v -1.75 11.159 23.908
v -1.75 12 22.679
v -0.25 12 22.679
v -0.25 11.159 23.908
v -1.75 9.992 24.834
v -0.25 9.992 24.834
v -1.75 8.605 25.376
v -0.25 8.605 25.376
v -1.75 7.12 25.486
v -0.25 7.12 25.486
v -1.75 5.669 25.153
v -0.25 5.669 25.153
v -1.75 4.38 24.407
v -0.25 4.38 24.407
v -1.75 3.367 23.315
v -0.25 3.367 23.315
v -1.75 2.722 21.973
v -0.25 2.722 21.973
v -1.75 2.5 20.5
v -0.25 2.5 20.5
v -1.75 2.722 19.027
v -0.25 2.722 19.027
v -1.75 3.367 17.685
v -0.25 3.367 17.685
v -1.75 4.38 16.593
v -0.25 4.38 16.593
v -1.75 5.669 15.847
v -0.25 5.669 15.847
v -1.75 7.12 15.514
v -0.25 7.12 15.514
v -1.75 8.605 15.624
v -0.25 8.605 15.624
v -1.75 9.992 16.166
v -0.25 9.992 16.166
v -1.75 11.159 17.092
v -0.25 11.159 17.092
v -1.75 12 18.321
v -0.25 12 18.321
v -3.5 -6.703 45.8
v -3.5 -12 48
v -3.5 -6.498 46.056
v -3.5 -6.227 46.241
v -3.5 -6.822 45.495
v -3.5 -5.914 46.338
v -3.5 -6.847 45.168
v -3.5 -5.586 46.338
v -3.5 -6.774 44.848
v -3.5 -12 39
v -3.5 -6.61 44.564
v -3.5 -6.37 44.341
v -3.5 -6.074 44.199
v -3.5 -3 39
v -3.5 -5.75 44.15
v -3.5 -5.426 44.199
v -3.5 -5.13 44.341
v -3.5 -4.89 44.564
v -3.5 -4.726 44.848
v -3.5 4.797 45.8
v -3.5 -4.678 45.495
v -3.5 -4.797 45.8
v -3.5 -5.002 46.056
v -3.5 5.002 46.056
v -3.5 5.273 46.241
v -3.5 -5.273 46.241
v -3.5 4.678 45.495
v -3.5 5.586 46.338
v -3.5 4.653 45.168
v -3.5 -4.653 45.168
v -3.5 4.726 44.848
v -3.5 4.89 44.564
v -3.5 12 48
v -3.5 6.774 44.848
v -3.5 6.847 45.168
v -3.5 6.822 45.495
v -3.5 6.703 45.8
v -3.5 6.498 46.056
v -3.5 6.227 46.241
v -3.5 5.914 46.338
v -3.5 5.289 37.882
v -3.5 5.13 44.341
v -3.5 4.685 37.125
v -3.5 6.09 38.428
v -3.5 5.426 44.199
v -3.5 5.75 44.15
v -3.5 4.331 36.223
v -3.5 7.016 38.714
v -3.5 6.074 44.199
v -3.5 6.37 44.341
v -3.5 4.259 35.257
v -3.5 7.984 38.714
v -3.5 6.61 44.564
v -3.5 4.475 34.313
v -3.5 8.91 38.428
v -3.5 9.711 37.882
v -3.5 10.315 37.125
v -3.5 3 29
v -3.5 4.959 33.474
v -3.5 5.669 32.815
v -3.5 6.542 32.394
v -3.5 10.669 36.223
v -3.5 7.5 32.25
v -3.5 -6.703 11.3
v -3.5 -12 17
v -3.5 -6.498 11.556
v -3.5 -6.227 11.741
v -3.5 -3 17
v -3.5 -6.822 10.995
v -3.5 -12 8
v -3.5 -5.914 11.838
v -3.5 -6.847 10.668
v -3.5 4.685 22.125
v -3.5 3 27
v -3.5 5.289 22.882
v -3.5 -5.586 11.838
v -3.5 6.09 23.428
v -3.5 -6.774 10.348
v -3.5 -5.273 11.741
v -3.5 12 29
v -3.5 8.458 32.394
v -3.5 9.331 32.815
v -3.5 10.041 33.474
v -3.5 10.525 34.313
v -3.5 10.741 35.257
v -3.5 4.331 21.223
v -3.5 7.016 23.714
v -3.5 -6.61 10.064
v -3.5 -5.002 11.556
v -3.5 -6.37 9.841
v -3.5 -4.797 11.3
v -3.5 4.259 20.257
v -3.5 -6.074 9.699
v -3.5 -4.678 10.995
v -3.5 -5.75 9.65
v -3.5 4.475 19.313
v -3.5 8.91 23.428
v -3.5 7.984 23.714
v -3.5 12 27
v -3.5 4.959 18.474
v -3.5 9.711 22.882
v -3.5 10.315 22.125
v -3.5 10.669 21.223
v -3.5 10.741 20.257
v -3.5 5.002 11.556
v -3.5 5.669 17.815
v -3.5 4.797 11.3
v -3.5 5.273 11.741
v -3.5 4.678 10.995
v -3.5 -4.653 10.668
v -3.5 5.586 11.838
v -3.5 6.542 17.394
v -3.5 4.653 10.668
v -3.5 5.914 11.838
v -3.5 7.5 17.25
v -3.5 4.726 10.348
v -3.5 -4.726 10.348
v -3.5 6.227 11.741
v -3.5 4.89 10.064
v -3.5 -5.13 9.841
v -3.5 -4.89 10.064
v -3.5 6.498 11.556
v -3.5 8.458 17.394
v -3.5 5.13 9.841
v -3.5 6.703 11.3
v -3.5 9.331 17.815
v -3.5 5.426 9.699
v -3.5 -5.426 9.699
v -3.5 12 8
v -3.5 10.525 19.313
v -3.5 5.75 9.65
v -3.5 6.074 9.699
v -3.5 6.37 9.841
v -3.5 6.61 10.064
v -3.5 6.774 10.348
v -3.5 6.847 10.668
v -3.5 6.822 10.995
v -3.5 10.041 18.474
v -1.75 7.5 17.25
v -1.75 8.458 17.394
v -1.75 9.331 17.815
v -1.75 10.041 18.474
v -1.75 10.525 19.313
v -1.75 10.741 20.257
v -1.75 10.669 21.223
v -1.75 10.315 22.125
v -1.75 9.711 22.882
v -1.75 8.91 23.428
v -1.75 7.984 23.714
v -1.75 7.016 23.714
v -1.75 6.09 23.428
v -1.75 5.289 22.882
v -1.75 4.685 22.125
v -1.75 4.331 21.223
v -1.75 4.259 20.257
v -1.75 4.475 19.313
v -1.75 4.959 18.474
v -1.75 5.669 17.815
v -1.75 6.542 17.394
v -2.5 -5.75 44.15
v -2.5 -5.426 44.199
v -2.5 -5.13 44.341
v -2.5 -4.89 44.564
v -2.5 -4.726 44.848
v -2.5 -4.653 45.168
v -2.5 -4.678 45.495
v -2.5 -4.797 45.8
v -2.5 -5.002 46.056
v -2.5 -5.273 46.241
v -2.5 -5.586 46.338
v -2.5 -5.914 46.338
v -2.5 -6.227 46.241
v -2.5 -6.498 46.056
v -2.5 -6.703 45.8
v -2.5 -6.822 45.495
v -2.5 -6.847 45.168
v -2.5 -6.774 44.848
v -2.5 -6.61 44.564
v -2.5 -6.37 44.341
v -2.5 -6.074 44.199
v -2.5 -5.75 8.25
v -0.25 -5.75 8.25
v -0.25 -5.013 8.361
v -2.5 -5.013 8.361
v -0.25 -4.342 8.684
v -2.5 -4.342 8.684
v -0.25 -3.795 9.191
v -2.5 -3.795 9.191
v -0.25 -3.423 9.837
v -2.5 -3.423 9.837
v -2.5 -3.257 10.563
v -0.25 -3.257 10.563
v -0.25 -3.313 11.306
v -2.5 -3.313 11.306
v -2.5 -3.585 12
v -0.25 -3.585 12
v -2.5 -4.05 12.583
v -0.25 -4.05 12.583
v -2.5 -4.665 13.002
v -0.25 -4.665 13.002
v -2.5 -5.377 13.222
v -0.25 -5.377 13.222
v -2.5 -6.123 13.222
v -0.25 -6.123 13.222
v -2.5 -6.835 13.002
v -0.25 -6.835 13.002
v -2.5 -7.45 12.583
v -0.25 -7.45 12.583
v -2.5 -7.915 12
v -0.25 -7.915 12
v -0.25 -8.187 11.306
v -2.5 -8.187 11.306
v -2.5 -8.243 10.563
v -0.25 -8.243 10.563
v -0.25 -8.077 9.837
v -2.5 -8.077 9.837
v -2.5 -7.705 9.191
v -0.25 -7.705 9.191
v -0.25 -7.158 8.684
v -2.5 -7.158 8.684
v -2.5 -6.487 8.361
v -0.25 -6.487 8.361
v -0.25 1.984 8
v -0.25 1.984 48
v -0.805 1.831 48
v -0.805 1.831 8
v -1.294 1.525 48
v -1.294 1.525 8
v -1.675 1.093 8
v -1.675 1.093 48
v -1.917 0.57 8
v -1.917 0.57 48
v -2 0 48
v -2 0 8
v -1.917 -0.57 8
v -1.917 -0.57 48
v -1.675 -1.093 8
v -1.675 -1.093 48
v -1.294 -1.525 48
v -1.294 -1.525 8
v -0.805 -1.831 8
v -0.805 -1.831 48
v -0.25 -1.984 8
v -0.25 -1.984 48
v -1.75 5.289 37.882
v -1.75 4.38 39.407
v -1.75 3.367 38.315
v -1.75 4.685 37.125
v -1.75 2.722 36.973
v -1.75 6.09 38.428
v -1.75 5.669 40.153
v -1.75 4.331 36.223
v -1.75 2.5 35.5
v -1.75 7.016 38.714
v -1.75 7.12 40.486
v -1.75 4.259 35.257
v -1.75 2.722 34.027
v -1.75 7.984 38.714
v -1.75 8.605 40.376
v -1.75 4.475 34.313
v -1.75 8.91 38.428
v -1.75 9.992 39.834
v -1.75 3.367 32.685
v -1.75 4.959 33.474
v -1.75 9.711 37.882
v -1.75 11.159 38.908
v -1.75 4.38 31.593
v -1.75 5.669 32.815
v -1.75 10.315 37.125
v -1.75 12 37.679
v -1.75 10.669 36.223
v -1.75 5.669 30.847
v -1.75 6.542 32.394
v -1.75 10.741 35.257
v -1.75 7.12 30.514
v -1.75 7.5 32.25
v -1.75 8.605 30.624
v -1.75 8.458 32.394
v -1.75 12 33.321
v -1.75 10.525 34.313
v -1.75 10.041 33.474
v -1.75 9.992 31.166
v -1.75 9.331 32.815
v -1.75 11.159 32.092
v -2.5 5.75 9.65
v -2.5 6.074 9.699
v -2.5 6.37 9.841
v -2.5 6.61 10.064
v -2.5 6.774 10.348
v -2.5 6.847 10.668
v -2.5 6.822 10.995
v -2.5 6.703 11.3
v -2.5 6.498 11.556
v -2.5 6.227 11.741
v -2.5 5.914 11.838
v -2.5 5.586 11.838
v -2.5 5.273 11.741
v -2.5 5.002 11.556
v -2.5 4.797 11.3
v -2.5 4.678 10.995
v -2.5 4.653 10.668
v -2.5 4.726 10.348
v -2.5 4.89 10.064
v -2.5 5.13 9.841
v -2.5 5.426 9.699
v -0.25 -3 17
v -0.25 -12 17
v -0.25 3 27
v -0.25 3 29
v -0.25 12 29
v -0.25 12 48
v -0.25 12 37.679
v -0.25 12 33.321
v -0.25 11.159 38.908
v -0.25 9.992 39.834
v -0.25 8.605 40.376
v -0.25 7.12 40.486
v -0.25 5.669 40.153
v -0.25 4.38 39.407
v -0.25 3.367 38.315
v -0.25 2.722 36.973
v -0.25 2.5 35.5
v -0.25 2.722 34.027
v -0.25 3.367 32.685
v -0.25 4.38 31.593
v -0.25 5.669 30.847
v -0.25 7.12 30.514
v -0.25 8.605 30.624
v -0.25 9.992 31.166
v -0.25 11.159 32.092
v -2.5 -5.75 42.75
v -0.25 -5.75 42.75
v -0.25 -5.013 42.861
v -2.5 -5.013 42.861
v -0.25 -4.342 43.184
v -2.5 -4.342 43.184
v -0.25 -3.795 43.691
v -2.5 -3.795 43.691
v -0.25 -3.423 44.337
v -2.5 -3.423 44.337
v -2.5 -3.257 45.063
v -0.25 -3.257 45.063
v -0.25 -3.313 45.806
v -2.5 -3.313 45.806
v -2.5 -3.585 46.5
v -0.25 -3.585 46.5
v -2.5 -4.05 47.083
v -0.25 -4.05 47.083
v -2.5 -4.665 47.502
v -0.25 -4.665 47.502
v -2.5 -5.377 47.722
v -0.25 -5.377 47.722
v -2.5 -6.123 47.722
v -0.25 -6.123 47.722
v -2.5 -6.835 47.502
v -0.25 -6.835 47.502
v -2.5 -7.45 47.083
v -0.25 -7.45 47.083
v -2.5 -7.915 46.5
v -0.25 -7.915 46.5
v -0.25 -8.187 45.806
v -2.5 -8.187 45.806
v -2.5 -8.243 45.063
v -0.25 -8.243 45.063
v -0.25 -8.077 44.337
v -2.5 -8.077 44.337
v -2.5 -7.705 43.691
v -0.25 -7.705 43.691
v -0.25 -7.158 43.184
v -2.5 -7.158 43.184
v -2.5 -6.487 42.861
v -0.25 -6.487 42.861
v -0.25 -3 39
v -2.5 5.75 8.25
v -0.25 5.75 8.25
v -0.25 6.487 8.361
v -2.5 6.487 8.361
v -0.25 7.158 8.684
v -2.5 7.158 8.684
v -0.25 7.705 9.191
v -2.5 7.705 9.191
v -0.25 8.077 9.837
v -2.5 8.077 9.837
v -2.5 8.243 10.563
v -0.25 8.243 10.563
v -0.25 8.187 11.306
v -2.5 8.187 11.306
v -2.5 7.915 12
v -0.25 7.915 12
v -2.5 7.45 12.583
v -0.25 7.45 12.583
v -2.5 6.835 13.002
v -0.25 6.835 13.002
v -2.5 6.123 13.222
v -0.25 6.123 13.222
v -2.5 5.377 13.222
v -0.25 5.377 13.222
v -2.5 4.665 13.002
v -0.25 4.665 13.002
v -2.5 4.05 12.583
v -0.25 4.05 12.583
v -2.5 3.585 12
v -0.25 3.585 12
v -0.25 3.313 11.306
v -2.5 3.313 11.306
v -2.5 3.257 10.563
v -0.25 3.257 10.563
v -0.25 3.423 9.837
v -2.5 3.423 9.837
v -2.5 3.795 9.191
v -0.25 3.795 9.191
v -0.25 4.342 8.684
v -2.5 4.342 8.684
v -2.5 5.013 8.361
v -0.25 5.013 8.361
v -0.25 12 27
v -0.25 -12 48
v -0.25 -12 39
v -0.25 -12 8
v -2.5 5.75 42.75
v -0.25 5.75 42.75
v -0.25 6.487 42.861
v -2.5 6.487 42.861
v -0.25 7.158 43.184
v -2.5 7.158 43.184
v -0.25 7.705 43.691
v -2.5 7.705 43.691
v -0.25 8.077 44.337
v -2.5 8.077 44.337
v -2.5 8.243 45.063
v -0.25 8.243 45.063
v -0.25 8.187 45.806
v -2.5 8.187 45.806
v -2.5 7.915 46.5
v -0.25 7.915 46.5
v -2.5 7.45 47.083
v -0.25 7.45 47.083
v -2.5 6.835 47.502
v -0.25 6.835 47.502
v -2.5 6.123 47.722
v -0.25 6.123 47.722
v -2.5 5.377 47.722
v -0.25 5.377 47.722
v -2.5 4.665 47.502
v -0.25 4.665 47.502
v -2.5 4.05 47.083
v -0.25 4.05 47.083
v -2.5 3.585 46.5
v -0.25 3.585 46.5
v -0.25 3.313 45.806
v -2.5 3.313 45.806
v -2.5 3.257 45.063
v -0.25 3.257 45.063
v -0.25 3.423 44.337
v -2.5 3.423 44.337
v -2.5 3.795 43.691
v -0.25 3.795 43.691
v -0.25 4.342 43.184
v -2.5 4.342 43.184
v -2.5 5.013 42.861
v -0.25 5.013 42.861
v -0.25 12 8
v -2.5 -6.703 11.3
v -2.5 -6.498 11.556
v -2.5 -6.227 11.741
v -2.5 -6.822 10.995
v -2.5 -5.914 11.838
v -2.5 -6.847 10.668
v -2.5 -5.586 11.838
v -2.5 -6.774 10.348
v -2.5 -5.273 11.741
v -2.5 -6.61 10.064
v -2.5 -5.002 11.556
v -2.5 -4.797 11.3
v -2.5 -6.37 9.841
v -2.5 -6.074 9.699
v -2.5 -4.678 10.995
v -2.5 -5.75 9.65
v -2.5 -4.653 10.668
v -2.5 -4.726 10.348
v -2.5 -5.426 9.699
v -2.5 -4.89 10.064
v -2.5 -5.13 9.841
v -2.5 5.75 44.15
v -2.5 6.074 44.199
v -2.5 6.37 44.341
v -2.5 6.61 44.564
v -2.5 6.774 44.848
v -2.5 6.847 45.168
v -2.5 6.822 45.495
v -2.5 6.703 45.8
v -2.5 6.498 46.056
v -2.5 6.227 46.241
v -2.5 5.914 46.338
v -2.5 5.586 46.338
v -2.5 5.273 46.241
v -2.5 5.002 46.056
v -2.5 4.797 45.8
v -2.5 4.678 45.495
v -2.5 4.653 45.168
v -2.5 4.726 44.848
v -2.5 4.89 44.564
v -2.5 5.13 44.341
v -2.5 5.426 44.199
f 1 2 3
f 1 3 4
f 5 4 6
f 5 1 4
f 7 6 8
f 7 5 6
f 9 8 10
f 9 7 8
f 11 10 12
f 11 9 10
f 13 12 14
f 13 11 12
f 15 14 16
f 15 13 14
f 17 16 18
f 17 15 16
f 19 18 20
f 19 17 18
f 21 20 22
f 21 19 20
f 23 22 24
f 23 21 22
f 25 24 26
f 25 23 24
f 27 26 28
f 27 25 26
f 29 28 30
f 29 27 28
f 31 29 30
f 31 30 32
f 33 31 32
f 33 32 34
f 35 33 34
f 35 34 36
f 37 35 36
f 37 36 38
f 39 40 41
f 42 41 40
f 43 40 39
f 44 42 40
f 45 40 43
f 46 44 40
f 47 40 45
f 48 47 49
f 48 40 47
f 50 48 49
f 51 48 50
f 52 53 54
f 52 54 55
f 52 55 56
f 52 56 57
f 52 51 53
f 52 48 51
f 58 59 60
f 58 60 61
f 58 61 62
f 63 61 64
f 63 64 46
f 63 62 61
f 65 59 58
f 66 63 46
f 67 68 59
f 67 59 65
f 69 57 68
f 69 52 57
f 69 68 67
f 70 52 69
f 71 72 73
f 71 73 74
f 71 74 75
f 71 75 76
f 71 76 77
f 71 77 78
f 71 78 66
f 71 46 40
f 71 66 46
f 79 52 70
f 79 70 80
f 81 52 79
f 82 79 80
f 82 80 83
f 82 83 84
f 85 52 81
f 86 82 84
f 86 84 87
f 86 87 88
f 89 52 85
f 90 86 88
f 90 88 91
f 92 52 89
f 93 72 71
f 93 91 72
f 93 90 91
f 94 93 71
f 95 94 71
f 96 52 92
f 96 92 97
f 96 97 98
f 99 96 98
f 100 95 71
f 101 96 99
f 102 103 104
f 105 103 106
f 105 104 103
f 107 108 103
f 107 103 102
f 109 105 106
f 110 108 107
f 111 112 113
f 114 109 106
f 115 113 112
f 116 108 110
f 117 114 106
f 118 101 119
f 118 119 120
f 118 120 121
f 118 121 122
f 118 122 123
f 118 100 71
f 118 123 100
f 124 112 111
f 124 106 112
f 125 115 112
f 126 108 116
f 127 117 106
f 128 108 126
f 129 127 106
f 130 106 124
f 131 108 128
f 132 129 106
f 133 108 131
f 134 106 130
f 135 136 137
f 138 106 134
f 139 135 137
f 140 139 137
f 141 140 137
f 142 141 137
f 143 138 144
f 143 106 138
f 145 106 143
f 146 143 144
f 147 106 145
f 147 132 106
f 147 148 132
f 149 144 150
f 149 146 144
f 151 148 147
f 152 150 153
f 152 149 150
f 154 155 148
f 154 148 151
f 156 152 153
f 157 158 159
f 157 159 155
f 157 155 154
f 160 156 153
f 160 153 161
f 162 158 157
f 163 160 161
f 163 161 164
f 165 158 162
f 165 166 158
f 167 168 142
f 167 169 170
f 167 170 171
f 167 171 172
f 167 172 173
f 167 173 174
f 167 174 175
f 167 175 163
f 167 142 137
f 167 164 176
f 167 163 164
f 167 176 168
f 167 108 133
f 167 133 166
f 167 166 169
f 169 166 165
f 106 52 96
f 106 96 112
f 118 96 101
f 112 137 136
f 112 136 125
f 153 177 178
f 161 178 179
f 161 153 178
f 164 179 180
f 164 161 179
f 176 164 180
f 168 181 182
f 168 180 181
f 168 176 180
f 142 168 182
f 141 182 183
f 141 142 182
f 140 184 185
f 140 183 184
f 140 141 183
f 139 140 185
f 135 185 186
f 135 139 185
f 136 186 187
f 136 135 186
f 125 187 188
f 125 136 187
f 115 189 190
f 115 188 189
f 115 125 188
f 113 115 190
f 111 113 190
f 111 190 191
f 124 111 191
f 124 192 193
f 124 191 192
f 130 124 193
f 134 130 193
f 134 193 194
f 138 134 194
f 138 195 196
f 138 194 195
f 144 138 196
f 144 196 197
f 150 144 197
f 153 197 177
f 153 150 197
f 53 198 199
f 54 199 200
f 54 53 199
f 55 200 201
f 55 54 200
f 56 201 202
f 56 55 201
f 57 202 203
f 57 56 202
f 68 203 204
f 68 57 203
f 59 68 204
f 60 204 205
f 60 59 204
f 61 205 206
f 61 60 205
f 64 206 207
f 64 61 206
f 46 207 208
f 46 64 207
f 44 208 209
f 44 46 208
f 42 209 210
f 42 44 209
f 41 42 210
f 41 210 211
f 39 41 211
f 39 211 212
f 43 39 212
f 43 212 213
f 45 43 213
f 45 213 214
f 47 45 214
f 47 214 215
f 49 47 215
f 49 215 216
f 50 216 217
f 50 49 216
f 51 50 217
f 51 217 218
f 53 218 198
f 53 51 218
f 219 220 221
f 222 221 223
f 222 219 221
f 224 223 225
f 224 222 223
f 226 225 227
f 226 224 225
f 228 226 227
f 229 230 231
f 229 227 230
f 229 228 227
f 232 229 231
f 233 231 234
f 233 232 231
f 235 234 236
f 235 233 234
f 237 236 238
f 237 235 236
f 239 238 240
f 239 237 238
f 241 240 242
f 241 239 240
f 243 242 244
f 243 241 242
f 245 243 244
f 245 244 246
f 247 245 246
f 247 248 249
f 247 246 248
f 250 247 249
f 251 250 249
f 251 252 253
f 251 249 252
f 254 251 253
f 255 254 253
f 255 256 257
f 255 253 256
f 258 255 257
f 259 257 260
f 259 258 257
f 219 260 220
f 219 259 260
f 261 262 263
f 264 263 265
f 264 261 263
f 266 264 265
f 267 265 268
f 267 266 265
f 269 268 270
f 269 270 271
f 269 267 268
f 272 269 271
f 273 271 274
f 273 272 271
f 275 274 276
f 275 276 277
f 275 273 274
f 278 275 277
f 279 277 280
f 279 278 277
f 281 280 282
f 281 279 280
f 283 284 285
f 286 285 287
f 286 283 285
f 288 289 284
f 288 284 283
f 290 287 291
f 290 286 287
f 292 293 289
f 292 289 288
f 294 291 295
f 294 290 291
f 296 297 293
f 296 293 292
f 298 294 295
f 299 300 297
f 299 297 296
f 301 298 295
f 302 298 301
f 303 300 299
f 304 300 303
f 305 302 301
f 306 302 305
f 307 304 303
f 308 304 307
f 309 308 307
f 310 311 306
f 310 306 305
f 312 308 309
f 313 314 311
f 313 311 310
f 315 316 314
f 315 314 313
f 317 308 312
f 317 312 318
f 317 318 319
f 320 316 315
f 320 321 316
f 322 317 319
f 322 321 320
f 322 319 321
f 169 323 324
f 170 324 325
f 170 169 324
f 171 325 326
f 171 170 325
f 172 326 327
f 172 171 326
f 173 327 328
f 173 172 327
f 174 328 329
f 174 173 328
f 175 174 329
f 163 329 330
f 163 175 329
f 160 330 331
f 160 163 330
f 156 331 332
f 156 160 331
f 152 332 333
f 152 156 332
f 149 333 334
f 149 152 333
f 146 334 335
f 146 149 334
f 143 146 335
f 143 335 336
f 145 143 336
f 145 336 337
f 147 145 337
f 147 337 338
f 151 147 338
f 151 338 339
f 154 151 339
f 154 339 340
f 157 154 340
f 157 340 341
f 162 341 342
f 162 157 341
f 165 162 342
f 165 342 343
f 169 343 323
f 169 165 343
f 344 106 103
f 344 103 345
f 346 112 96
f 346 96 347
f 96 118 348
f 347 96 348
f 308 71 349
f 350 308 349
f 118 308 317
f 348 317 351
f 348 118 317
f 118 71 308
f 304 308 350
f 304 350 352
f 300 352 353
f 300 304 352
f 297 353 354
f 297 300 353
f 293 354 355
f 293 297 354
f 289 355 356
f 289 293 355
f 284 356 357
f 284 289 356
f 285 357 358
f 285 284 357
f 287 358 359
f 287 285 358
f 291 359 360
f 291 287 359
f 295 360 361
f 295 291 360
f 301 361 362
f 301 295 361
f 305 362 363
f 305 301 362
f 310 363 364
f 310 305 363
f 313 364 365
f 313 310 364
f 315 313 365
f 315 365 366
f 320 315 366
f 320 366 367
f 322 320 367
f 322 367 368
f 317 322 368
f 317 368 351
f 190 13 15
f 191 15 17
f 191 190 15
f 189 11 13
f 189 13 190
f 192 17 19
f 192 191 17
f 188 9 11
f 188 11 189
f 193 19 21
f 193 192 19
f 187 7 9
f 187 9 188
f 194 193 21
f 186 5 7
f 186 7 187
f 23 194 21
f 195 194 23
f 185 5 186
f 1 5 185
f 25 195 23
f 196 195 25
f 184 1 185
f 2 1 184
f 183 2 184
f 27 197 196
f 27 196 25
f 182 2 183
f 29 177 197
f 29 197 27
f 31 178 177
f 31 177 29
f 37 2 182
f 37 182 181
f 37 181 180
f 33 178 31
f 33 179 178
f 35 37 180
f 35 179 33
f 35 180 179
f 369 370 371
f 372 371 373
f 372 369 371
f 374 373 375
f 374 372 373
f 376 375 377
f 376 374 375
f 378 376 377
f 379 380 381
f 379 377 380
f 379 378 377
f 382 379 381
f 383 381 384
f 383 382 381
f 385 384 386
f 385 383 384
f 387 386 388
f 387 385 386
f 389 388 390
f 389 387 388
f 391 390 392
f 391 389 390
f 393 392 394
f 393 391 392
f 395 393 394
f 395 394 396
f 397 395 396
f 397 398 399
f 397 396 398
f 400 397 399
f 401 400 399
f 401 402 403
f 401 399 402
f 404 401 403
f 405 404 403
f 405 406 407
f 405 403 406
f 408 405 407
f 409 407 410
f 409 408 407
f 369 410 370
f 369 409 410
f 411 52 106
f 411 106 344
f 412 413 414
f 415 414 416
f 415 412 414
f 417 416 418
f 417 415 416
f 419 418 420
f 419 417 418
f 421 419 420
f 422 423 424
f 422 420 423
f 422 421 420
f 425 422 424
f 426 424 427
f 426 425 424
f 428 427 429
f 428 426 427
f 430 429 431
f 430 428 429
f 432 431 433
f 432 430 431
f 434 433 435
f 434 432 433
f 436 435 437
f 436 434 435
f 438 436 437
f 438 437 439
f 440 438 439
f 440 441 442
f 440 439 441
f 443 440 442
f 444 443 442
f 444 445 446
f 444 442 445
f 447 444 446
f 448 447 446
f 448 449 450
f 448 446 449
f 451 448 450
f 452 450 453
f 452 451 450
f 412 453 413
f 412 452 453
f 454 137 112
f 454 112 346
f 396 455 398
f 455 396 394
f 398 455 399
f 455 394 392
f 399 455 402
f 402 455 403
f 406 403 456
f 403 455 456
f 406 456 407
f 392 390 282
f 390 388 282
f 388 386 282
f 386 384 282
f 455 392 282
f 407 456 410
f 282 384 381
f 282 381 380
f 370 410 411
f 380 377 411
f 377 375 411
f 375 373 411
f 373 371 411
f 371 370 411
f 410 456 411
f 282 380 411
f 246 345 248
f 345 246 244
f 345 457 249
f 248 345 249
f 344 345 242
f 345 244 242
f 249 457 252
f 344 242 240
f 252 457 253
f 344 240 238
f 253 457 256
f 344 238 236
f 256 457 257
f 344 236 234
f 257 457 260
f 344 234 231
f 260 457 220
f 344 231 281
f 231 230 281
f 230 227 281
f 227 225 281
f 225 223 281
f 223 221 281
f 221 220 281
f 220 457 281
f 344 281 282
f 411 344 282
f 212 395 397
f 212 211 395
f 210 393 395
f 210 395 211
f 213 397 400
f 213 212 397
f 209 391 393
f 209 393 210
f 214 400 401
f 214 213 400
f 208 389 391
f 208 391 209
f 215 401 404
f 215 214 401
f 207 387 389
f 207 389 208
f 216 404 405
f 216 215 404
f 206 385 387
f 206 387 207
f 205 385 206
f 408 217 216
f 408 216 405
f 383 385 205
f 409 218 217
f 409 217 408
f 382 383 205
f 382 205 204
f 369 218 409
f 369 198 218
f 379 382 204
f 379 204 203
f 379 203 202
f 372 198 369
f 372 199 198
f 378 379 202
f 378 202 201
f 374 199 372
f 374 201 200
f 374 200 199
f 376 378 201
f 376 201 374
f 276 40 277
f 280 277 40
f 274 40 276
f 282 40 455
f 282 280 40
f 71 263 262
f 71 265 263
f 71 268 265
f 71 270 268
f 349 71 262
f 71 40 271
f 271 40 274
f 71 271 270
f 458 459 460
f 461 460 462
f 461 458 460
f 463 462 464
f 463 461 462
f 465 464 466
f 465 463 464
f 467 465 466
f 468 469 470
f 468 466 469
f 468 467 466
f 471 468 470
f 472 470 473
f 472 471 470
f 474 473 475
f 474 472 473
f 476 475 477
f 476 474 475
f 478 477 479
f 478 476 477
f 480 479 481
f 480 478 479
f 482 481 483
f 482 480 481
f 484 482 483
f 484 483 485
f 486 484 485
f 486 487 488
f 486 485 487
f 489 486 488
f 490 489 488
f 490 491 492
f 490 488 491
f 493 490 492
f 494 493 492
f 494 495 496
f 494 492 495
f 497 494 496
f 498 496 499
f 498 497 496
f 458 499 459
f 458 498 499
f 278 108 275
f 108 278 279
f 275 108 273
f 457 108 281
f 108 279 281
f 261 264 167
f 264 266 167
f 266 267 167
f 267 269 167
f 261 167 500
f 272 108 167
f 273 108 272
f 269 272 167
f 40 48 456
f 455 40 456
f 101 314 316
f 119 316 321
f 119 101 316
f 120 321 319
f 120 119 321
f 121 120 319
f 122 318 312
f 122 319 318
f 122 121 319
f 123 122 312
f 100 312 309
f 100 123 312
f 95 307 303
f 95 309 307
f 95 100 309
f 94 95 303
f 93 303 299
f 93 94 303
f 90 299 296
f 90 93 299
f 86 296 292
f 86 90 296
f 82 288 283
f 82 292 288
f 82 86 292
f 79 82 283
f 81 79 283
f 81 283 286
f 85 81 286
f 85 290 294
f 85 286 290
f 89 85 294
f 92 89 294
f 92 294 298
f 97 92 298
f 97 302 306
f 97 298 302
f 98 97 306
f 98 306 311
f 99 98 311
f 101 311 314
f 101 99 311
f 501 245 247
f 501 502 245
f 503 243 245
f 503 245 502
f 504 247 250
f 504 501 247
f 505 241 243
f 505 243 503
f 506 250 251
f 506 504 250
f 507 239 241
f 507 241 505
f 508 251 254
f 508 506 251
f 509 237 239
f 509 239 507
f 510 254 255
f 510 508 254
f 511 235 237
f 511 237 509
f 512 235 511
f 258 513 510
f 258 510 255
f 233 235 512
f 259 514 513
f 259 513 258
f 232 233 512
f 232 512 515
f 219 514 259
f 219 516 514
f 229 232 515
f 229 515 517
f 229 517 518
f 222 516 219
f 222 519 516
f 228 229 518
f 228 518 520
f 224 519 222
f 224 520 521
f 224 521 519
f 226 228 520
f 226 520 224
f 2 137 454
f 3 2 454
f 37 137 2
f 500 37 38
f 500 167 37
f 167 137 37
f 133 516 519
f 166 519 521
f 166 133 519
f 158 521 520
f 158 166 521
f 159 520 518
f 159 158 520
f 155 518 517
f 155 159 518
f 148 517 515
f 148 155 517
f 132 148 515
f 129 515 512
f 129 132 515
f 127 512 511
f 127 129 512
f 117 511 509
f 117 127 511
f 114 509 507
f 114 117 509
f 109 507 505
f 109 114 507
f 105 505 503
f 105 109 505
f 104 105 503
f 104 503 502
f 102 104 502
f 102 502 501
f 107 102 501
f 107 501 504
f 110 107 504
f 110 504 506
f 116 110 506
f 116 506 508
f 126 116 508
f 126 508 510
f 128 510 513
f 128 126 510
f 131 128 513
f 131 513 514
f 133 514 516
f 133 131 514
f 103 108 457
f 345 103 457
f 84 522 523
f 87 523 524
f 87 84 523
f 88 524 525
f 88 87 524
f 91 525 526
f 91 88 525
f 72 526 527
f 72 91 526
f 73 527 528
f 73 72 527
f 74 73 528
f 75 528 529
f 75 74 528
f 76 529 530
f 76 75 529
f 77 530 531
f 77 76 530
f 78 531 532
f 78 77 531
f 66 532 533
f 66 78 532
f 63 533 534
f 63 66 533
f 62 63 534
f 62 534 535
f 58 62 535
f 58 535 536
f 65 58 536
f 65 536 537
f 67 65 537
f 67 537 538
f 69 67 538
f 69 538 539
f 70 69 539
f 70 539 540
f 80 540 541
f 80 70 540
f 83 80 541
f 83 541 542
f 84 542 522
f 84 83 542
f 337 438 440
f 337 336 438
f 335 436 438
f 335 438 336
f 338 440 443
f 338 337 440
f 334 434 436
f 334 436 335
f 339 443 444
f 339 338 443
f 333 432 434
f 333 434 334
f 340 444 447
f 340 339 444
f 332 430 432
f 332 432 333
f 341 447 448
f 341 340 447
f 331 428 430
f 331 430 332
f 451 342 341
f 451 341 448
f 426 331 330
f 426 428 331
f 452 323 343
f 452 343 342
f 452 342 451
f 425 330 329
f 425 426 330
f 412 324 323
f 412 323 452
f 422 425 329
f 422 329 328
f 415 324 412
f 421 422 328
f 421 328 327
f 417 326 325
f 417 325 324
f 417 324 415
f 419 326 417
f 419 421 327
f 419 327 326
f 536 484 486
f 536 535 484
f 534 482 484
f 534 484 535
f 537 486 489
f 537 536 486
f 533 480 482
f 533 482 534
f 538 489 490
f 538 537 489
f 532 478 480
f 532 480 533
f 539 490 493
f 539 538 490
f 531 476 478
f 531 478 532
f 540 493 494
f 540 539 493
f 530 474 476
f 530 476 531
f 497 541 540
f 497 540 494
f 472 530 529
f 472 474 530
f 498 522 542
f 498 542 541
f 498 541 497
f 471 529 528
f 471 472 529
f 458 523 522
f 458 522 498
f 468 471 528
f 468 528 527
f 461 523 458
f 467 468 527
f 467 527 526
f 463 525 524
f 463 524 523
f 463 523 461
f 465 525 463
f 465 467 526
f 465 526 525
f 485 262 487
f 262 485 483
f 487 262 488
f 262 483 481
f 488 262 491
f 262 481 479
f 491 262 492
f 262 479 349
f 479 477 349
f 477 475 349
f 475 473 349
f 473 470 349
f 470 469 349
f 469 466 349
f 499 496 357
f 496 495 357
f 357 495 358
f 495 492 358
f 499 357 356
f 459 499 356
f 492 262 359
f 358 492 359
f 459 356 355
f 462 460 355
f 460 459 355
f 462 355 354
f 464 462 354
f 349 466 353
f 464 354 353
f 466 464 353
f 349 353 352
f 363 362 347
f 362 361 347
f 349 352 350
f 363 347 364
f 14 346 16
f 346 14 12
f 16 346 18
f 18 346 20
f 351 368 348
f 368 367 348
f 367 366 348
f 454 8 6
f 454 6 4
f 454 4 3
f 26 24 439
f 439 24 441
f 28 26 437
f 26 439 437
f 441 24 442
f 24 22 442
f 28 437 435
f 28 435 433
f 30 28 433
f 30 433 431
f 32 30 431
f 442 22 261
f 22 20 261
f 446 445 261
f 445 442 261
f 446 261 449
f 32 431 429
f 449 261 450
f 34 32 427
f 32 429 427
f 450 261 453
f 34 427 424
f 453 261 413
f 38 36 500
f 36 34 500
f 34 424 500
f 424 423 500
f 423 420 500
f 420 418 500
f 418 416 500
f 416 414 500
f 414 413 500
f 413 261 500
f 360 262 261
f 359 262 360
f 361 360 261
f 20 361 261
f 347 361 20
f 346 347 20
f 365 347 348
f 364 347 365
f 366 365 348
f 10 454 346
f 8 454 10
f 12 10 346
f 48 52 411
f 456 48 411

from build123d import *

# Parameters (mm, degrees)
CYLINDER028_R           = 1.1
CYLINDER028_DEPTH       = 10
CYLINDER031_R           = 0.9
CYLINDER031_DEPTH       = 10
CYLINDER029_R           = 2.5
CYLINDER029_DEPTH       = 3.5
CYLINDER030_R           = 2
CYLINDER030_DEPTH       = 5.2
LINK011_PLACEMENT_ANGLE = 90
LINK012_PLACEMENT_ANGLE = 90
CYLINDER027_R           = 1.1
CYLINDER027_DEPTH       = 10
CYLINDER025_R           = 1.1
CYLINDER025_DEPTH       = 10
CYLINDER026_R           = 1.1
CYLINDER026_DEPTH       = 10
LINK010_PLACEMENT_ANGLE = 90
LINK009_PLACEMENT_ANGLE = 90
CYLINDER018_R           = 3.25
CYLINDER018_DEPTH       = 10
BOX010_W                = 3.25
BOX010_H                = 9
BOX010_DEPTH            = 22
BOX009_W                = 3.25
BOX009_H                = 9
BOX009_DEPTH            = 2
CYLINDER024_R           = 5
CYLINDER024_DEPTH       = 1.5
CYLINDER023_R           = 5
CYLINDER023_DEPTH       = 1.5
CYLINDER019_R           = 3.25
CYLINDER019_DEPTH       = 10
CYLINDER004_R           = 2
CYLINDER004_DEPTH       = 40
BOX004_W                = 3.25
BOX004_H                = 24
BOX004_DEPTH            = 40


with BuildPart() as cylinder028:
    # Cylinder028 → Cylinder028 (new body)
    with BuildSketch(Plane(origin=(-3.5, 5.75, 44.25), x_dir=(0, 0, -1), z_dir=(1, 0, 0))):
        Circle(CYLINDER028_R)
    extrude(amount=CYLINDER028_DEPTH)


with BuildPart() as cylinder031:
    # Cylinder031 → Cylinder031 (new body)
    with BuildSketch(Plane.XY):
        Circle(CYLINDER031_R)
    extrude(amount=CYLINDER031_DEPTH)


with BuildPart() as cylinder029:
    # Cylinder029 → Cylinder029 (new body)
    with BuildSketch(Plane.XY):
        Circle(CYLINDER029_R)
    extrude(amount=CYLINDER029_DEPTH)


with BuildPart() as markor4mmod_m011:
    # Cylinder030 → Cylinder030 (new body)
    with BuildSketch(Plane.XY):
        Circle(CYLINDER030_R)
    extrude(amount=CYLINDER030_DEPTH)

    # Fusion018: union Cylinder029
    add(cylinder029.part)

    # Cut007: cut Cylinder031
    add(cylinder031.part, mode=Mode.SUBTRACT)


with BuildPart() as markor4mmod_m014:
    # Link011 base: copy of Markor4mmOD_M011
    add(markor4mmod_m011.part)


with BuildPart() as markor4mmod_m014_1:
    # Link011 placement: moved
    add(markor4mmod_m014.part.moved(Location((-2.5, -5.75, 44.25))).rotate(Axis((-2.5, -5.75, 44.25), (0, 1, 0)), LINK011_PLACEMENT_ANGLE))


with BuildPart() as markor4mmod_m015:
    # Link012 base: copy of Markor4mmOD_M011
    add(markor4mmod_m011.part)


with BuildPart() as markor4mmod_m015_1:
    # Link012 placement: moved
    add(markor4mmod_m015.part.moved(Location((-2.5, 5.75, 44.25))).rotate(Axis((-2.5, 5.75, 44.25), (0, 1, 0)), LINK012_PLACEMENT_ANGLE))


with BuildPart() as fusion017:
    # Cylinder027 → Cylinder027 (new body)
    with BuildSketch(Plane(origin=(-3.5, -5.75, 44.25), x_dir=(0, 0, -1), z_dir=(1, 0, 0))):
        Circle(CYLINDER027_R)
    extrude(amount=CYLINDER027_DEPTH)

    # Fusion017: union Cylinder028, Markor4mmOD_M014, Markor4mmOD_M015
    add(cylinder028.part)
    add(markor4mmod_m014_1.part)
    add(markor4mmod_m015_1.part)


with BuildPart() as cylinder025:
    # Cylinder025 → Cylinder025 (new body)
    with BuildSketch(Plane(origin=(-3.5, -5.75, 9.75), x_dir=(0, 0, -1), z_dir=(1, 0, 0))):
        Circle(CYLINDER025_R)
    extrude(amount=CYLINDER025_DEPTH)


with BuildPart() as cylinder026:
    # Cylinder026 → Cylinder026 (new body)
    with BuildSketch(Plane(origin=(-3.5, 5.75, 9.75), x_dir=(0, 0, -1), z_dir=(1, 0, 0))):
        Circle(CYLINDER026_R)
    extrude(amount=CYLINDER026_DEPTH)


with BuildPart() as markor4mmod_m013:
    # Link010 base: copy of Markor4mmOD_M011
    add(markor4mmod_m011.part)


with BuildPart() as markor4mmod_m013_1:
    # Link010 placement: moved
    add(markor4mmod_m013.part.moved(Location((-2.5, 5.75, 9.75))).rotate(Axis((-2.5, 5.75, 9.75), (0, 1, 0)), LINK010_PLACEMENT_ANGLE))


with BuildPart() as fusion019:
    # Link009 base: copy of Markor4mmOD_M011
    add(markor4mmod_m011.part)


with BuildPart() as fusion019_1:
    # Link009 placement: moved
    add(fusion019.part.moved(Location((-2.5, -5.75, 9.75))).rotate(Axis((-2.5, -5.75, 9.75), (0, 1, 0)), LINK009_PLACEMENT_ANGLE))

    # Fusion016: union Cylinder025, Cylinder026, Markor4mmOD_M013
    add(cylinder025.part)
    add(cylinder026.part)
    add(markor4mmod_m013_1.part)

    # Fusion019: union Fusion017
    add(fusion017.part)


with BuildPart() as cylinder018:
    # Cylinder018 → Cylinder018 (new body)
    with BuildSketch(Plane(origin=(-3.5, 7.5, 34.5), x_dir=(0, 0, -1), z_dir=(1, 0, 0))):
        Circle(CYLINDER018_R)
    extrude(amount=CYLINDER018_DEPTH)


with BuildPart() as cube010:
    # Box010 → Box010 (new body)
    with BuildSketch(Plane(origin=(-3.5, -12, 16), x_dir=(1, 0, 0), z_dir=(0, 0, 1))):
        with Locations((1.625, 4.5)):
            Rectangle(BOX010_W, BOX010_H)
    extrude(amount=BOX010_DEPTH)


with BuildPart() as cube009:
    # Box009 → Box009 (new body)
    with BuildSketch(Plane(origin=(-3.5, 3, 26), x_dir=(1, 0, 0), z_dir=(0, 0, 1))):
        with Locations((1.625, 4.5)):
            Rectangle(BOX009_W, BOX009_H)
    extrude(amount=BOX009_DEPTH)


with BuildPart() as cylinder024:
    # Cylinder024 → Cylinder024 (new body)
    with BuildSketch(Plane(origin=(-1.75, 7.5, 19.5), x_dir=(0, 0, -1), z_dir=(1, 0, 0))):
        Circle(CYLINDER024_R)
    extrude(amount=CYLINDER024_DEPTH)


with BuildPart() as fusion015:
    # Cylinder023 → Cylinder023 (new body)
    with BuildSketch(Plane(origin=(-1.75, 7.5, 34.5), x_dir=(0, 0, -1), z_dir=(1, 0, 0))):
        Circle(CYLINDER023_R)
    extrude(amount=CYLINDER023_DEPTH)

    # Fusion015: union Cylinder024
    add(cylinder024.part)


with BuildPart() as fusion011:
    # Cylinder019 → Cylinder019 (new body)
    with BuildSketch(Plane(origin=(-3.5, 7.5, 19.5), x_dir=(0, 0, -1), z_dir=(1, 0, 0))):
        Circle(CYLINDER019_R)
    extrude(amount=CYLINDER019_DEPTH)

    # Fusion011: union Cylinder018, Cube010, Cube009, Fusion015
    add(cylinder018.part)
    add(cube010.part)
    add(cube009.part)
    add(fusion015.part)


with BuildPart() as beamhole:
    # Cylinder004 → Cylinder004 (new body)
    with BuildSketch(Plane.XY):
        Circle(CYLINDER004_R)
    extrude(amount=CYLINDER004_DEPTH)


with BuildPart() as coppera:
    # Box004 → Box004 (new body)
    with BuildSketch(Plane(origin=(-3.5, -12, 0), x_dir=(1, 0, 0), z_dir=(0, 0, 1))):
        with Locations((1.625, 12)):
            Rectangle(BOX004_W, BOX004_H)
    extrude(amount=BOX004_DEPTH)

    # Cut001: cut Beamhole
    add(beamhole.part, mode=Mode.SUBTRACT)


with BuildPart() as coppera_1:
    # Cut001 placement: moved
    add(coppera.part.moved(Location((0, 0, 7))))

    # Cut005: cut Fusion011
    add(fusion011.part, mode=Mode.SUBTRACT)

    # Cut008: cut Fusion019
    add(fusion019_1.part, mode=Mode.SUBTRACT)


with BuildPart() as coppera_2:
    # Cut008 placement: moved
    add(coppera_1.part.moved(Location((0, 0, 1))))


solid = coppera_2.part
